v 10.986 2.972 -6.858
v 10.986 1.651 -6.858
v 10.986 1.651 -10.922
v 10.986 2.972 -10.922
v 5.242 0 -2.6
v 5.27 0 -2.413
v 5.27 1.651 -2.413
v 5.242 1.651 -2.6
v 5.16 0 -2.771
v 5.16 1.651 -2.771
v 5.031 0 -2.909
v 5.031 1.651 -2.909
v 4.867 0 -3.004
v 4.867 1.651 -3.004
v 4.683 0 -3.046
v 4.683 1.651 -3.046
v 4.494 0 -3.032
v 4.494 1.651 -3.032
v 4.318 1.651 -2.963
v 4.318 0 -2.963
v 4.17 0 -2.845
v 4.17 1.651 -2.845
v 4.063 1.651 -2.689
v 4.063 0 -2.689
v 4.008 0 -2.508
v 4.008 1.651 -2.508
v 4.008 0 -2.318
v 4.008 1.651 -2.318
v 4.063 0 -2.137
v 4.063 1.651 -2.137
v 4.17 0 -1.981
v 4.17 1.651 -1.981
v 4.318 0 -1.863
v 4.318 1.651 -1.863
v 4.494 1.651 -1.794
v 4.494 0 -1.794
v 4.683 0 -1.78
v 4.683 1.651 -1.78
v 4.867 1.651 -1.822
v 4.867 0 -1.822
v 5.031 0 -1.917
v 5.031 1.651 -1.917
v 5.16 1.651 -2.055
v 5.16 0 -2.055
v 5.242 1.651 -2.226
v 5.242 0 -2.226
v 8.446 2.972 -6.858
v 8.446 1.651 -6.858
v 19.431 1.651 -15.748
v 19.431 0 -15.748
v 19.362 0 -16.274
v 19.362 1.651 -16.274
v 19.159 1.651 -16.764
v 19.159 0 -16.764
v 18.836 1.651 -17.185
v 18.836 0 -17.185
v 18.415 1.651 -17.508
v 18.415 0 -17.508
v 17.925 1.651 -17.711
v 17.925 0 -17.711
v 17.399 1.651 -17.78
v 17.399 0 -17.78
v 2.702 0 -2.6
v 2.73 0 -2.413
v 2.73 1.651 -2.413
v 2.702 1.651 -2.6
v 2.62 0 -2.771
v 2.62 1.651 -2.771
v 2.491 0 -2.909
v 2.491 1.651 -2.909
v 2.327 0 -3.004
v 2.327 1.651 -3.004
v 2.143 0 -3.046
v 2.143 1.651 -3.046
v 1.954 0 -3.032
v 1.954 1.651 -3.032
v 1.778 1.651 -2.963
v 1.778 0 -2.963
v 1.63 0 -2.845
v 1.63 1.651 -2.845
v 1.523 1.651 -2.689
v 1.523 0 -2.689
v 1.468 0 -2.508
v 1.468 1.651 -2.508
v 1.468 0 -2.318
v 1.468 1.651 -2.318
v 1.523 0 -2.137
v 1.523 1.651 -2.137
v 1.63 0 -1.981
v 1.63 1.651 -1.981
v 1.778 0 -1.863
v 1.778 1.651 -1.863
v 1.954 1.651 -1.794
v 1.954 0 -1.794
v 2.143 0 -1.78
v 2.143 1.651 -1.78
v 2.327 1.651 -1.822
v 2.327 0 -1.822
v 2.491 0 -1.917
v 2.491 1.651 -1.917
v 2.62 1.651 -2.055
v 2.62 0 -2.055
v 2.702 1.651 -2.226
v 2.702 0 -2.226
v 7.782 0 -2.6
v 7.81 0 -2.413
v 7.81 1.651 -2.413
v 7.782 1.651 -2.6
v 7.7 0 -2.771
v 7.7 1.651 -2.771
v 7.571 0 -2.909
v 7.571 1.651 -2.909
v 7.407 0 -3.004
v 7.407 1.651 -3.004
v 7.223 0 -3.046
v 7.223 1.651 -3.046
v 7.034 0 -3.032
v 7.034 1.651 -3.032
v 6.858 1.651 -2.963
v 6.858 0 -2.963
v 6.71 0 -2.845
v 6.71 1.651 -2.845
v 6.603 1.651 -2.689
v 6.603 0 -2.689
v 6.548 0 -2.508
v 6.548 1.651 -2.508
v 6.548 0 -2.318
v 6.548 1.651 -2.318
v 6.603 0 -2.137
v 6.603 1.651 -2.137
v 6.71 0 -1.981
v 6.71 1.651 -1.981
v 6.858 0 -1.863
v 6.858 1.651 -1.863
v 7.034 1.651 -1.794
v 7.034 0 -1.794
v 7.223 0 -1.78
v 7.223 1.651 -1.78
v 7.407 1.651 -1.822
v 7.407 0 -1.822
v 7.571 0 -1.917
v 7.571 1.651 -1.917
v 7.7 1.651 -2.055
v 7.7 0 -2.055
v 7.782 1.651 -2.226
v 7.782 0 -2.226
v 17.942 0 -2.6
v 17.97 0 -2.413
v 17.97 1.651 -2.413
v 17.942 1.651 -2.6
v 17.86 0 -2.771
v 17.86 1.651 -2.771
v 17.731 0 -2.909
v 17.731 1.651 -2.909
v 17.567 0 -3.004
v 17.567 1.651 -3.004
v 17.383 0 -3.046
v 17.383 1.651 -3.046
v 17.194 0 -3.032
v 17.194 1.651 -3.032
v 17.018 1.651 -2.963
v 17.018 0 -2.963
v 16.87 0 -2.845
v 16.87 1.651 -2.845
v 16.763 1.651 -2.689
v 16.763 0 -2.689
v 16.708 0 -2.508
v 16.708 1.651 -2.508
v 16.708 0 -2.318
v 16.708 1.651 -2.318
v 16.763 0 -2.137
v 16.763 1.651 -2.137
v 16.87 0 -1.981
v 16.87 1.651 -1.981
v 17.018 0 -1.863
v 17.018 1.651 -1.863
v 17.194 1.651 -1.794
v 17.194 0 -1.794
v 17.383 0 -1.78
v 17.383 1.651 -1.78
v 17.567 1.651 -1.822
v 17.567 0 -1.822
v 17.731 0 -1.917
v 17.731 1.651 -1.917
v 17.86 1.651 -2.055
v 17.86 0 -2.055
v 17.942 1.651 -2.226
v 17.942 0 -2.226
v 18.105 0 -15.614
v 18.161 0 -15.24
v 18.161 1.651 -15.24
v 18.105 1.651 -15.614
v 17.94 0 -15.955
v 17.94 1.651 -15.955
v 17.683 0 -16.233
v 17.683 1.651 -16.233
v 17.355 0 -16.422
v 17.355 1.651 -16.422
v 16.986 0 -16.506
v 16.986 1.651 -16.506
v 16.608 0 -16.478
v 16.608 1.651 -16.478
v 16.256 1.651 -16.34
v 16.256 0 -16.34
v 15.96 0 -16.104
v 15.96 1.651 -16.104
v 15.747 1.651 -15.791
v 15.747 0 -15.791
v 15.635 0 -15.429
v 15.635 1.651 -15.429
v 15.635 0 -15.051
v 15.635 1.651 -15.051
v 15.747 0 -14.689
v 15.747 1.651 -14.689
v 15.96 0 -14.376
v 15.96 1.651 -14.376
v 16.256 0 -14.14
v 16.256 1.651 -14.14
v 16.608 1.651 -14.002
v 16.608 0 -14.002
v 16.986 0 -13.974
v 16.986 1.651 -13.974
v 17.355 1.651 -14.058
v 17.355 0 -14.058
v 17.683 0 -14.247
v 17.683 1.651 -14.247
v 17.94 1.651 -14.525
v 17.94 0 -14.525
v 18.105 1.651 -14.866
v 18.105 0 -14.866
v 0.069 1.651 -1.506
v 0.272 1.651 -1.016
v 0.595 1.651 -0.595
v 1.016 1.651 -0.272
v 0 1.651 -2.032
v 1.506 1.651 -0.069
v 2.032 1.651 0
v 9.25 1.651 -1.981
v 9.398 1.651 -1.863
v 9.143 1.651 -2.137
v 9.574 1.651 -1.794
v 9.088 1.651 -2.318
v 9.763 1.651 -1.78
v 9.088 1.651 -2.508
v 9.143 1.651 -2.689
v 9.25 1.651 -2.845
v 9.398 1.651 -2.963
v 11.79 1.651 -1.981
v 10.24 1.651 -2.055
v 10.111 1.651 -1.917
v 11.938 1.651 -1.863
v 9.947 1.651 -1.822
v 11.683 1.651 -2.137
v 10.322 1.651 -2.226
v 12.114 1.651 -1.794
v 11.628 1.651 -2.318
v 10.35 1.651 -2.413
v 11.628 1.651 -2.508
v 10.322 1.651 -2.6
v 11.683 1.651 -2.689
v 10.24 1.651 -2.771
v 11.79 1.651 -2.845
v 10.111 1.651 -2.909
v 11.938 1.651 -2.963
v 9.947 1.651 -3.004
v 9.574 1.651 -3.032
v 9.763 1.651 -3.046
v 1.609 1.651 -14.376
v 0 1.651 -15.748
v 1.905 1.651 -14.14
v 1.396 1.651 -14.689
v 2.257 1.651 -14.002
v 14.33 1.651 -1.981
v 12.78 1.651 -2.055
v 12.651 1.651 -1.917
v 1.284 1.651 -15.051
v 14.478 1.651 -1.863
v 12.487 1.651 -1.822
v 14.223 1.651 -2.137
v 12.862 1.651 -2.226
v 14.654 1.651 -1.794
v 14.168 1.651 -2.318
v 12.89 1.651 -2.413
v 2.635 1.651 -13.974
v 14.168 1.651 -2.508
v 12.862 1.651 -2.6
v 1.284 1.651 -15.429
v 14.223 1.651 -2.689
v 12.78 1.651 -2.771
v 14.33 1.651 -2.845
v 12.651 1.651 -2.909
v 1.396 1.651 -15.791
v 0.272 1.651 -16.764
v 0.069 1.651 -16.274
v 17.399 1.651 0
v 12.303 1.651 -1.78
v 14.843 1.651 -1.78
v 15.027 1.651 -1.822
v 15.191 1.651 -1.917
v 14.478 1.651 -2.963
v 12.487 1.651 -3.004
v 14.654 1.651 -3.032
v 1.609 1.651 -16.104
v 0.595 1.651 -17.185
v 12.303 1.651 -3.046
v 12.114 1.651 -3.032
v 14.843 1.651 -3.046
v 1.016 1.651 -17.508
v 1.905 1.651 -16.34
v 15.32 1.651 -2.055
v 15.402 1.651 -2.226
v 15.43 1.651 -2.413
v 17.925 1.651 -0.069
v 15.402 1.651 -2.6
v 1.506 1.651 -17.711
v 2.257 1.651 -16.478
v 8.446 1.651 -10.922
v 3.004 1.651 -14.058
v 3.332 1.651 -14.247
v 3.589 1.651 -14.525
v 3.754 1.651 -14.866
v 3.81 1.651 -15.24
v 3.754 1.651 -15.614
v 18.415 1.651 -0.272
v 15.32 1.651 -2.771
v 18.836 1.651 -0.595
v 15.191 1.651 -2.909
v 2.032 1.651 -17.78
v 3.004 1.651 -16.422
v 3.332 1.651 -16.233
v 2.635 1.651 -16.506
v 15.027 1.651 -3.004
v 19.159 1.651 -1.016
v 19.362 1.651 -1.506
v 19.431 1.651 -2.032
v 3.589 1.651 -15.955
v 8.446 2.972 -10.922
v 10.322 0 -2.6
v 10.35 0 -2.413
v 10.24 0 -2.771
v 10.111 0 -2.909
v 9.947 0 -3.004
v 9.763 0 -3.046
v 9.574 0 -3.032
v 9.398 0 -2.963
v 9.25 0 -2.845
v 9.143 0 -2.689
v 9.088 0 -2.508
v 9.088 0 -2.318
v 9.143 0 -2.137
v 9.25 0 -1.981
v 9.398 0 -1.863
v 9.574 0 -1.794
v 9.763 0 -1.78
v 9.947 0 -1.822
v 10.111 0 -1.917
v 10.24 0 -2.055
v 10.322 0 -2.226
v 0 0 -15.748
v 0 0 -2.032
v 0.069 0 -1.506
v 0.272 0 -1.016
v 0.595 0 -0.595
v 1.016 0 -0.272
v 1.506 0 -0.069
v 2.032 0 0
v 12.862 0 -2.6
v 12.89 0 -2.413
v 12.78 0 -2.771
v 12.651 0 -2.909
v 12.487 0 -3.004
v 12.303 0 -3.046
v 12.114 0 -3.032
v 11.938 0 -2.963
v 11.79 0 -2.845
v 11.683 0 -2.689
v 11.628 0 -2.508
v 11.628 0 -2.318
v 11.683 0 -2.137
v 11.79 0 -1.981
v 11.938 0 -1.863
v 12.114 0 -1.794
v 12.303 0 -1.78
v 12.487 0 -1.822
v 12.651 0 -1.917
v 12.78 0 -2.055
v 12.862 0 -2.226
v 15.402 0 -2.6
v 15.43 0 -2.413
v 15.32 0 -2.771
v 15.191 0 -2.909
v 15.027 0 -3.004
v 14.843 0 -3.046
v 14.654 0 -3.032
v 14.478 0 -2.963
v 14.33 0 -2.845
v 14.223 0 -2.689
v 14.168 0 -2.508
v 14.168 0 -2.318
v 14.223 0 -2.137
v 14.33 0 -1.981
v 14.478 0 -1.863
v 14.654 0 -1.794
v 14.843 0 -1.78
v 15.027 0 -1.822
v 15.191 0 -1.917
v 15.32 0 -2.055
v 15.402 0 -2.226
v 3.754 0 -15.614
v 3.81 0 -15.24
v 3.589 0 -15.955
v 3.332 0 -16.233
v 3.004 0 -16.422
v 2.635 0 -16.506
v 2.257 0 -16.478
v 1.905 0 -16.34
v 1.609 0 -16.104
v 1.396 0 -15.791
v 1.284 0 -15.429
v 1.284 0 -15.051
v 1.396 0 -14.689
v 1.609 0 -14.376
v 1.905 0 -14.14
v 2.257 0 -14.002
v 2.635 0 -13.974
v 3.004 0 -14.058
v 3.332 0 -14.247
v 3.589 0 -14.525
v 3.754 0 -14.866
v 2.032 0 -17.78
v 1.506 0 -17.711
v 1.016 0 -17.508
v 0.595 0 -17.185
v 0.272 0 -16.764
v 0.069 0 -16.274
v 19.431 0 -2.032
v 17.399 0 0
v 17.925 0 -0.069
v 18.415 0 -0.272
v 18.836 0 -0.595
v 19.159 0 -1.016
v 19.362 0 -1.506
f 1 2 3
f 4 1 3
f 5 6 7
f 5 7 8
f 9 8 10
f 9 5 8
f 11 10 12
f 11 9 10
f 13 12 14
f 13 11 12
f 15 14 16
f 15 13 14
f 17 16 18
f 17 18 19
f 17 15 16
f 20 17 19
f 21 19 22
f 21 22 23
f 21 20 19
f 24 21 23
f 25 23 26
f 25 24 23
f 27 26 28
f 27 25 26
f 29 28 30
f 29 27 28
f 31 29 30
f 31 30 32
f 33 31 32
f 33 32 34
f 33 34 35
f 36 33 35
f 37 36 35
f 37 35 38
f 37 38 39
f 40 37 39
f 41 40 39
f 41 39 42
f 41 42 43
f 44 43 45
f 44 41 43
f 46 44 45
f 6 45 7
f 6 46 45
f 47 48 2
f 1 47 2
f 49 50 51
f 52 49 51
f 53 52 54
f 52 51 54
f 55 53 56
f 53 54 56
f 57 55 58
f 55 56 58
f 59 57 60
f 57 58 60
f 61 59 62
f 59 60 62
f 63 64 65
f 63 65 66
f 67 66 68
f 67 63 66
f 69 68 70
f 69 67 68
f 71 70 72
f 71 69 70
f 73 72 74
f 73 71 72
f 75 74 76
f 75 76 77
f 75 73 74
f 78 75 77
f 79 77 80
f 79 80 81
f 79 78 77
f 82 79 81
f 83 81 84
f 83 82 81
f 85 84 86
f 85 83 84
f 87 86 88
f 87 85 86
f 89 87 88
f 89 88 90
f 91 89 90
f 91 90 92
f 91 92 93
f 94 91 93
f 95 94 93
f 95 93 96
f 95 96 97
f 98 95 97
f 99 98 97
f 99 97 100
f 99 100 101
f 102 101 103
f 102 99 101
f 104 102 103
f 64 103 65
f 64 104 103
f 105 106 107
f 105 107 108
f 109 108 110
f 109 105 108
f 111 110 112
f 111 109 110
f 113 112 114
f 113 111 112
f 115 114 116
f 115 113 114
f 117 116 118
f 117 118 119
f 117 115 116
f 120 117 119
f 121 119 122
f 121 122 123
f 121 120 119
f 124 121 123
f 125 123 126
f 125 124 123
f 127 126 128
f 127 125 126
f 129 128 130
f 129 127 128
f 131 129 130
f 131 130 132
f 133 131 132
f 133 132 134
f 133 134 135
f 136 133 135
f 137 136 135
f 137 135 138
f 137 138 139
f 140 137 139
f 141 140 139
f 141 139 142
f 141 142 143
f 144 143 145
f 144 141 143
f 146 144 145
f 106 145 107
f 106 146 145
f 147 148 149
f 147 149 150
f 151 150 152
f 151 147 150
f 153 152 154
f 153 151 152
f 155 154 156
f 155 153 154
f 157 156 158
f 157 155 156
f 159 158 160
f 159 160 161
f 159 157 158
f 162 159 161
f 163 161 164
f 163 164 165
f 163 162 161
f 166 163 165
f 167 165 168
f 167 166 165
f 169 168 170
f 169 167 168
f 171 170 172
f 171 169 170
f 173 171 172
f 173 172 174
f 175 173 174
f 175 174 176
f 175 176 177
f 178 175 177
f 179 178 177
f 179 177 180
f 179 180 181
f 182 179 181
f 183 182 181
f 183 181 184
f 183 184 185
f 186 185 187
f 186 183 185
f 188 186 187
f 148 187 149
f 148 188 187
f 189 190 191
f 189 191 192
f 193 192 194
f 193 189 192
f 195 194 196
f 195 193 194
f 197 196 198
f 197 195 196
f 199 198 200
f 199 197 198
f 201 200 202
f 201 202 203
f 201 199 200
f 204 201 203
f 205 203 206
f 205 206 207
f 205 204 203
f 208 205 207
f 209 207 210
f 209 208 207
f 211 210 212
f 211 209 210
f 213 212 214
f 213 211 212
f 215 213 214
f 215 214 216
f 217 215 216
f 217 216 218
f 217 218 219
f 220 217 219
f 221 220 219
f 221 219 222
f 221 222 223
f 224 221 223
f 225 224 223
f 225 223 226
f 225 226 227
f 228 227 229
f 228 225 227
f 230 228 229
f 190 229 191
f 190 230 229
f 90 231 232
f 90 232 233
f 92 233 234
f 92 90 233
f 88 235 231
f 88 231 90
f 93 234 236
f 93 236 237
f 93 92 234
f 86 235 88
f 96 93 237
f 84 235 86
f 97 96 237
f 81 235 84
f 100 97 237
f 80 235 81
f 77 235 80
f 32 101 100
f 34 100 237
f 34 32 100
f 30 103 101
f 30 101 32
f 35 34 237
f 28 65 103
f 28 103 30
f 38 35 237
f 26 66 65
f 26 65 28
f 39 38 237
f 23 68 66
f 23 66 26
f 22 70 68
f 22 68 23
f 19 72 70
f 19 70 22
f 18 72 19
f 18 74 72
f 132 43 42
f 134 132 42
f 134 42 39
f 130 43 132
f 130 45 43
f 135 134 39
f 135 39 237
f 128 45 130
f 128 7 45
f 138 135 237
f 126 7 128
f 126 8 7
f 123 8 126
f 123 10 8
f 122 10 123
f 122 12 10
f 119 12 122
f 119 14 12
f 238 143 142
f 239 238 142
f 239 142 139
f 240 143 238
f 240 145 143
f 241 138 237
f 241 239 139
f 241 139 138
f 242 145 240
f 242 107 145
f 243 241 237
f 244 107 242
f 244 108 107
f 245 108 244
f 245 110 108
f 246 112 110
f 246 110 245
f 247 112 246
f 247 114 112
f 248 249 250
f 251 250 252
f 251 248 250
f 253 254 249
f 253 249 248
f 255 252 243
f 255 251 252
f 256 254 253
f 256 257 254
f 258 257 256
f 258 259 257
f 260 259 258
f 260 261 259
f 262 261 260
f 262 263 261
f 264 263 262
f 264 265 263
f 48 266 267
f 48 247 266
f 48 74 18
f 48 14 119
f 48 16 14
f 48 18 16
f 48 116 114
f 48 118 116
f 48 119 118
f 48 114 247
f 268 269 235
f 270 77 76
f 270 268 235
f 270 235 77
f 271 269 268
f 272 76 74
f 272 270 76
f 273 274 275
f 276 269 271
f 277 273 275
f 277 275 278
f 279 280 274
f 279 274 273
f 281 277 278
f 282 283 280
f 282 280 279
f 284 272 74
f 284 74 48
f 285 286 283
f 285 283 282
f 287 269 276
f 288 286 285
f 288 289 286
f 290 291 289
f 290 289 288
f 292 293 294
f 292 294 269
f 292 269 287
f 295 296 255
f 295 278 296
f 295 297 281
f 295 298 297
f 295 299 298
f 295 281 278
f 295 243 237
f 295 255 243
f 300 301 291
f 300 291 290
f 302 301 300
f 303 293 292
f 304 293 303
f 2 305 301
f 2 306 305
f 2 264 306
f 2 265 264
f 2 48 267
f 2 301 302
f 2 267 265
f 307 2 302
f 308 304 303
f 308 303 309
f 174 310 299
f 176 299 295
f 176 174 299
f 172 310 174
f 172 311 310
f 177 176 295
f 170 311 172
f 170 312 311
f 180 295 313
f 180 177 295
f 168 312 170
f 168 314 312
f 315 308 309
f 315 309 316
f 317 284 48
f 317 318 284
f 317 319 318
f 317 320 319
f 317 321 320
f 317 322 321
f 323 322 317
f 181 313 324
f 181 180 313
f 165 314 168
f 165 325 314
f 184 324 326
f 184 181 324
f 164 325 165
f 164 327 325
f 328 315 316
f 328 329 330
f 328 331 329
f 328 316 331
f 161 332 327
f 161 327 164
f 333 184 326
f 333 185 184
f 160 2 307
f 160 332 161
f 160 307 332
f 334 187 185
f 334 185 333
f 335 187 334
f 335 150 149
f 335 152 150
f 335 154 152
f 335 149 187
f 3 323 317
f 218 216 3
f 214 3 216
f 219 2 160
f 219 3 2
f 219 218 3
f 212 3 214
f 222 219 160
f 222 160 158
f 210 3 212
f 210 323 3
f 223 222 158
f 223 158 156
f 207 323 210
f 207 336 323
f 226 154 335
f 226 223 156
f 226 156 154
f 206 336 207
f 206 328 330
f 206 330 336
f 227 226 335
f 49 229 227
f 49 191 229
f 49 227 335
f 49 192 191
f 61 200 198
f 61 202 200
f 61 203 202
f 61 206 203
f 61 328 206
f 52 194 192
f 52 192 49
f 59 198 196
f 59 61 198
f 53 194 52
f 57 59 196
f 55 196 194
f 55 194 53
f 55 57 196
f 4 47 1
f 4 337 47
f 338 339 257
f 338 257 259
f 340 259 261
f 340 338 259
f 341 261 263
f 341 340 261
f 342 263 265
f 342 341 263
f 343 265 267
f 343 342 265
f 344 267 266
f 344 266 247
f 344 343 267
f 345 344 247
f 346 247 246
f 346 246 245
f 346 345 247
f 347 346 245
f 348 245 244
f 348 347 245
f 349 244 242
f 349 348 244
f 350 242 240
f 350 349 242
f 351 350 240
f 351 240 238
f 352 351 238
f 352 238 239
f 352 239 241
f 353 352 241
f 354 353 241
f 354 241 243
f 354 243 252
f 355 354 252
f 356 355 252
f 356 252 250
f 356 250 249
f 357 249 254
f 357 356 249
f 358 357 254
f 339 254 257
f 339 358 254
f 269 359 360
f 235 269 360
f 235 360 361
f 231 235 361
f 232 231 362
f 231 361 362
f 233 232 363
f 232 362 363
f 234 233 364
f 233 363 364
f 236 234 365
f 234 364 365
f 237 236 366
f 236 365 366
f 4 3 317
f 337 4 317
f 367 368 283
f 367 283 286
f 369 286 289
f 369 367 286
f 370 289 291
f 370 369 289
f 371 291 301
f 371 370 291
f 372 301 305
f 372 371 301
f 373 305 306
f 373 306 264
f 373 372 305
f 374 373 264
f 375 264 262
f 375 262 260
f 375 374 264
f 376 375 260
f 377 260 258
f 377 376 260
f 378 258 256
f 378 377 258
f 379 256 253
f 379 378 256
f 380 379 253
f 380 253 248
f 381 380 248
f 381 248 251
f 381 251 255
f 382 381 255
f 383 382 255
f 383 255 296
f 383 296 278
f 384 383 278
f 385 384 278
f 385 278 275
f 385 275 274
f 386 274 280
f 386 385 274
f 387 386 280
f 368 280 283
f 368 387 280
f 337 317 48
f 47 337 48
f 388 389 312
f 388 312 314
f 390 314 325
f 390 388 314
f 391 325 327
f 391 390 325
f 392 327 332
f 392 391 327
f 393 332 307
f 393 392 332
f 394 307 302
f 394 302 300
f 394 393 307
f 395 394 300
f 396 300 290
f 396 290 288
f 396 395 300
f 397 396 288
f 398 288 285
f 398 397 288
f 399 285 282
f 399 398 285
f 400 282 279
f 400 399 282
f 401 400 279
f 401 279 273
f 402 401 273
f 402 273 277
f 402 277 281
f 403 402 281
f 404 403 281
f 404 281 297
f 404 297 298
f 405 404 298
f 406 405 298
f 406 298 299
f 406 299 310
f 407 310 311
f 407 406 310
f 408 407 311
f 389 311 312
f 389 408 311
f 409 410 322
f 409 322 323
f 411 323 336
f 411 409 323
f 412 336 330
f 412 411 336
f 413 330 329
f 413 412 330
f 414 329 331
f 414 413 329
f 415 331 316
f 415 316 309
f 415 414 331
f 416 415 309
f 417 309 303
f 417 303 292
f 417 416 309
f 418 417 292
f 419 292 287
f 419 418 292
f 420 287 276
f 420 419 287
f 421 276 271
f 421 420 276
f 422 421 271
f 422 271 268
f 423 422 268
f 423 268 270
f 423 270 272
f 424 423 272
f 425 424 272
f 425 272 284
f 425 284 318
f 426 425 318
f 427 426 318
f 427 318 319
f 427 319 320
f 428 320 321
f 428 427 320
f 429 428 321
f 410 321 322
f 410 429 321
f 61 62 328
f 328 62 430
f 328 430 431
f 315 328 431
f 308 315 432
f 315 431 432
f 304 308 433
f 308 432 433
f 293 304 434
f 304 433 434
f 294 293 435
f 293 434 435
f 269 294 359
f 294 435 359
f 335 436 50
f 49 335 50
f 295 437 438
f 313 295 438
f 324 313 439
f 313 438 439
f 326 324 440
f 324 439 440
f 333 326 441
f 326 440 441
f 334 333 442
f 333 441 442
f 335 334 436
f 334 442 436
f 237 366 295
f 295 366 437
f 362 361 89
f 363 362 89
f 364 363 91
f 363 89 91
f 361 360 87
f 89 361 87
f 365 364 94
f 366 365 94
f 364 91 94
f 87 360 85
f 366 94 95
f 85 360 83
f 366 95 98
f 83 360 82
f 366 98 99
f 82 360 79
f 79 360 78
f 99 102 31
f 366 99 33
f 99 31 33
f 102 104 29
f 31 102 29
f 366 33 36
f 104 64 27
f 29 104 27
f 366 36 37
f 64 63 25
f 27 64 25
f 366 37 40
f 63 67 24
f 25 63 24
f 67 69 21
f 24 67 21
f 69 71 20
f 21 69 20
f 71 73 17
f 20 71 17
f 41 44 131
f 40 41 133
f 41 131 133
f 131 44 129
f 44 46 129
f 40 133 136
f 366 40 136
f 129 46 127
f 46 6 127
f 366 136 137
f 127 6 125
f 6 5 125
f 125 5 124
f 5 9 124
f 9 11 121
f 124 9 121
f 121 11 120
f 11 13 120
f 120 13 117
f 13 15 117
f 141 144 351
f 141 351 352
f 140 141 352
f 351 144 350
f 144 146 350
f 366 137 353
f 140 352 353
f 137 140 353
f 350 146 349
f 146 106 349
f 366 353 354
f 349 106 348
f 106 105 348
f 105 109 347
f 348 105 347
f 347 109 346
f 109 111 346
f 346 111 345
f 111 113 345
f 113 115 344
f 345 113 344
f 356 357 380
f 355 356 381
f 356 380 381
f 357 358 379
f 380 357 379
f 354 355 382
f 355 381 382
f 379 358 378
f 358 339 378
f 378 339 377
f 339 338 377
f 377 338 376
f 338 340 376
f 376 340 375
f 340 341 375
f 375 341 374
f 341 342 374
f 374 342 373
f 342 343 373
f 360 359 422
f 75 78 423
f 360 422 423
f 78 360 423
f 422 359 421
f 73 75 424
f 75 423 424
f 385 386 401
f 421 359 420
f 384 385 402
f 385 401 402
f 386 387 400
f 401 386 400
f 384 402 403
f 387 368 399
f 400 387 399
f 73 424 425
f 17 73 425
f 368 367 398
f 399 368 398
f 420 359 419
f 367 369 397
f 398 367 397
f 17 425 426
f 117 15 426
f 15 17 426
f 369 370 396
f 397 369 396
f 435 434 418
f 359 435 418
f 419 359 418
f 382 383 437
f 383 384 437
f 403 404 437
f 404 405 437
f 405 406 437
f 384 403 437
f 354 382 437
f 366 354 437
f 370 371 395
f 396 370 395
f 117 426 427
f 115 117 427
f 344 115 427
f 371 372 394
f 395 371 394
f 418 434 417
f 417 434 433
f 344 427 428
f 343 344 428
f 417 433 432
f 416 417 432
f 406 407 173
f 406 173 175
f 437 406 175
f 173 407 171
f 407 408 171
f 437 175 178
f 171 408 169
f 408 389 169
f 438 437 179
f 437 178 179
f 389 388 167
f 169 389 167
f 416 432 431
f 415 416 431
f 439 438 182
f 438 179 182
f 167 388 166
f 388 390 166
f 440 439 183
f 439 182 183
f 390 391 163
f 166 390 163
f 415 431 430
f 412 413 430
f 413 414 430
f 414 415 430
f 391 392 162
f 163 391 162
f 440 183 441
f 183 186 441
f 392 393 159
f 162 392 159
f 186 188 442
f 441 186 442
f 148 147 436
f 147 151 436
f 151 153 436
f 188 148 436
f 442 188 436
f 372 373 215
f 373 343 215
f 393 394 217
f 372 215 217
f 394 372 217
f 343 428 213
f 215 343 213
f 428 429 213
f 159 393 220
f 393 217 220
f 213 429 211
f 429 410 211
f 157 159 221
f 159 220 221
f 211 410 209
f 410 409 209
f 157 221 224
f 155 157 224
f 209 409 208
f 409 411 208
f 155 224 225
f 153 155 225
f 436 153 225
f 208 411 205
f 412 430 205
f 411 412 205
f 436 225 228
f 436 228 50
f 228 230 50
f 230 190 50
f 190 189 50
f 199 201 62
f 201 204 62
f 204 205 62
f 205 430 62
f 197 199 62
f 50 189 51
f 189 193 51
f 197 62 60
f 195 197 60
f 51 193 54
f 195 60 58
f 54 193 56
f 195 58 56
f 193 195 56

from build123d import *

# Parameters (mm, degrees)
SKETCH1_R           = 1.27
SKETCH1_R_2         = 0.635
BOSS_EXTRUDE1_DEPTH = 1.651
SKETCH2_W           = 1.27
SKETCH2_H           = 2.032
BOSS_EXTRUDE2_DEPTH = 1.3208


with BuildPart() as part:
    # Sketch1 → Boss-Extrude1 (new body)
    with BuildSketch(Plane(origin=(0, 0, 0), x_dir=(1, 0, 0), z_dir=(0, 1, 0))):
        with BuildLine():
            Line((2.032, 0), (17.399, 0))
            ThreePointArc((17.399, 0), (18.835840979, 0.595159021), (19.431, 2.032))
            Line((19.431, 2.032), (19.431, 15.748))
            ThreePointArc((19.431, 15.748), (18.835840979, 17.184840979), (17.399, 17.78))
            Line((17.399, 17.78), (2.032, 17.78))
            ThreePointArc((2.032, 17.78), (0.595159021, 17.184840979), (0, 15.748))
            Line((0, 15.748), (0, 2.032))
            ThreePointArc((0, 2.032), (0.595159021, 0.595159021), (2.032, 0))
        make_face()
        with Locations((2.54, 15.24)):
            Circle(SKETCH1_R, mode=Mode.SUBTRACT)
        with Locations((16.891, 15.24)):
            Circle(SKETCH1_R, mode=Mode.SUBTRACT)
        with Locations((2.0955, 2.413)):
            Circle(SKETCH1_R_2, mode=Mode.SUBTRACT)
        with Locations((4.6355, 2.413)):
            Circle(SKETCH1_R_2, mode=Mode.SUBTRACT)
        with Locations((7.1755, 2.413)):
            Circle(SKETCH1_R_2, mode=Mode.SUBTRACT)
        with Locations((9.7155, 2.413)):
            Circle(SKETCH1_R_2, mode=Mode.SUBTRACT)
        with Locations((12.2555, 2.413)):
            Circle(SKETCH1_R_2, mode=Mode.SUBTRACT)
        with Locations((14.7955, 2.413)):
            Circle(SKETCH1_R_2, mode=Mode.SUBTRACT)
        with Locations((17.3355, 2.413)):
            Circle(SKETCH1_R_2, mode=Mode.SUBTRACT)
    extrude(amount=BOSS_EXTRUDE1_DEPTH)

    # Sketch2 → Boss-Extrude2 (add)
    with BuildSketch(Plane(origin=(0, 1.651, 0), x_dir=(1, 0, 0), z_dir=(0, 1, 0))):
        with Locations((9.0805, 7.874)):
            Rectangle(SKETCH2_W, SKETCH2_H)
        Polygon((8.4455, 8.89), (9.7155, 8.89), (9.7155, 6.858), (10.9855, 6.858), (10.9855, 10.922), (8.4455, 10.922), align=None)
    extrude(amount=BOSS_EXTRUDE2_DEPTH)


solid = part.part
